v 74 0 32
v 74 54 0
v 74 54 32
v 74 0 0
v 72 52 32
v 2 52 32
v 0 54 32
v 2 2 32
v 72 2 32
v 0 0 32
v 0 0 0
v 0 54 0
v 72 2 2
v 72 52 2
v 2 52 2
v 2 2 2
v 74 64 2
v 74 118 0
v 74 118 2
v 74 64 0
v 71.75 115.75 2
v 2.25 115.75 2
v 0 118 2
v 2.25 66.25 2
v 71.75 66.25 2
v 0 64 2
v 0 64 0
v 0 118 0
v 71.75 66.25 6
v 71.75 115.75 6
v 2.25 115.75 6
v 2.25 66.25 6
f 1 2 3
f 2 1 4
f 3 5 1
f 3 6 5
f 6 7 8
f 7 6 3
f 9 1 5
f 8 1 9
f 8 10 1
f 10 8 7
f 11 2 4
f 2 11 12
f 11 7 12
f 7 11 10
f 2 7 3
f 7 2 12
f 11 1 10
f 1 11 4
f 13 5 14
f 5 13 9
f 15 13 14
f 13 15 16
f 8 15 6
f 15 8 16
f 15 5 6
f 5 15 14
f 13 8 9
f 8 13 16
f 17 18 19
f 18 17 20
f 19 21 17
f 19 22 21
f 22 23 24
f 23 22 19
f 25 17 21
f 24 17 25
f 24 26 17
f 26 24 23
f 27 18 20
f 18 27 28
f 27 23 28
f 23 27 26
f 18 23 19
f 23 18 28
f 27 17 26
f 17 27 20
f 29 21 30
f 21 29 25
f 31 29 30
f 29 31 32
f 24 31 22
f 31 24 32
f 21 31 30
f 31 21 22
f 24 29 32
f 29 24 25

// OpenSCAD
// Box with a press-fit lid - a hollow rectangular box (open top) and a separate lid whose plug
// drops into the opening. The two parts are laid side by side. NOVEL general part.
//
// @desc hollow box with a separate press-fit lid
// @prompt Design a small box with a lid in OpenSCAD: an inner space {il} by {iw} by {ih} mm with {wall} mm walls, and a separate lid whose plug drops {lip} mm into the opening. Lay the two parts side by side. Reply with a single complete OpenSCAD file.
// @param il   inner length, mm     [20:80]
// @param iw   inner width, mm      [20:60]
// @param ih   inner height, mm     [10:50]
// @param wall wall thickness, mm   [1.6:4]
// @param lip  lid plug depth, mm   [3:10]

il   = 70;
iw   = 50;
ih   = 30;
wall = 2;
lip  = 4;

$fn = 32;

ol = il + 2 * wall;
ow = iw + 2 * wall;

module box() {
    difference() {
        cube([ol, ow, ih + wall]);
        translate([wall, wall, wall]) cube([il, iw, ih + 1]);   // open-top cavity
    }
}

module lid() {
    cl = il - 0.5;                 // plug: 0.25 mm clearance per side
    cw = iw - 0.5;
    union() {
        cube([ol, ow, wall]);                                    // top plate, full footprint
        translate([(ol - cl) / 2, (ow - cw) / 2, 0])
            cube([cl, cw, wall + lip]);                          // plug (overlaps the plate -> one solid)
    }
}

box();
translate([0, ow + 10, 0]) lid();
